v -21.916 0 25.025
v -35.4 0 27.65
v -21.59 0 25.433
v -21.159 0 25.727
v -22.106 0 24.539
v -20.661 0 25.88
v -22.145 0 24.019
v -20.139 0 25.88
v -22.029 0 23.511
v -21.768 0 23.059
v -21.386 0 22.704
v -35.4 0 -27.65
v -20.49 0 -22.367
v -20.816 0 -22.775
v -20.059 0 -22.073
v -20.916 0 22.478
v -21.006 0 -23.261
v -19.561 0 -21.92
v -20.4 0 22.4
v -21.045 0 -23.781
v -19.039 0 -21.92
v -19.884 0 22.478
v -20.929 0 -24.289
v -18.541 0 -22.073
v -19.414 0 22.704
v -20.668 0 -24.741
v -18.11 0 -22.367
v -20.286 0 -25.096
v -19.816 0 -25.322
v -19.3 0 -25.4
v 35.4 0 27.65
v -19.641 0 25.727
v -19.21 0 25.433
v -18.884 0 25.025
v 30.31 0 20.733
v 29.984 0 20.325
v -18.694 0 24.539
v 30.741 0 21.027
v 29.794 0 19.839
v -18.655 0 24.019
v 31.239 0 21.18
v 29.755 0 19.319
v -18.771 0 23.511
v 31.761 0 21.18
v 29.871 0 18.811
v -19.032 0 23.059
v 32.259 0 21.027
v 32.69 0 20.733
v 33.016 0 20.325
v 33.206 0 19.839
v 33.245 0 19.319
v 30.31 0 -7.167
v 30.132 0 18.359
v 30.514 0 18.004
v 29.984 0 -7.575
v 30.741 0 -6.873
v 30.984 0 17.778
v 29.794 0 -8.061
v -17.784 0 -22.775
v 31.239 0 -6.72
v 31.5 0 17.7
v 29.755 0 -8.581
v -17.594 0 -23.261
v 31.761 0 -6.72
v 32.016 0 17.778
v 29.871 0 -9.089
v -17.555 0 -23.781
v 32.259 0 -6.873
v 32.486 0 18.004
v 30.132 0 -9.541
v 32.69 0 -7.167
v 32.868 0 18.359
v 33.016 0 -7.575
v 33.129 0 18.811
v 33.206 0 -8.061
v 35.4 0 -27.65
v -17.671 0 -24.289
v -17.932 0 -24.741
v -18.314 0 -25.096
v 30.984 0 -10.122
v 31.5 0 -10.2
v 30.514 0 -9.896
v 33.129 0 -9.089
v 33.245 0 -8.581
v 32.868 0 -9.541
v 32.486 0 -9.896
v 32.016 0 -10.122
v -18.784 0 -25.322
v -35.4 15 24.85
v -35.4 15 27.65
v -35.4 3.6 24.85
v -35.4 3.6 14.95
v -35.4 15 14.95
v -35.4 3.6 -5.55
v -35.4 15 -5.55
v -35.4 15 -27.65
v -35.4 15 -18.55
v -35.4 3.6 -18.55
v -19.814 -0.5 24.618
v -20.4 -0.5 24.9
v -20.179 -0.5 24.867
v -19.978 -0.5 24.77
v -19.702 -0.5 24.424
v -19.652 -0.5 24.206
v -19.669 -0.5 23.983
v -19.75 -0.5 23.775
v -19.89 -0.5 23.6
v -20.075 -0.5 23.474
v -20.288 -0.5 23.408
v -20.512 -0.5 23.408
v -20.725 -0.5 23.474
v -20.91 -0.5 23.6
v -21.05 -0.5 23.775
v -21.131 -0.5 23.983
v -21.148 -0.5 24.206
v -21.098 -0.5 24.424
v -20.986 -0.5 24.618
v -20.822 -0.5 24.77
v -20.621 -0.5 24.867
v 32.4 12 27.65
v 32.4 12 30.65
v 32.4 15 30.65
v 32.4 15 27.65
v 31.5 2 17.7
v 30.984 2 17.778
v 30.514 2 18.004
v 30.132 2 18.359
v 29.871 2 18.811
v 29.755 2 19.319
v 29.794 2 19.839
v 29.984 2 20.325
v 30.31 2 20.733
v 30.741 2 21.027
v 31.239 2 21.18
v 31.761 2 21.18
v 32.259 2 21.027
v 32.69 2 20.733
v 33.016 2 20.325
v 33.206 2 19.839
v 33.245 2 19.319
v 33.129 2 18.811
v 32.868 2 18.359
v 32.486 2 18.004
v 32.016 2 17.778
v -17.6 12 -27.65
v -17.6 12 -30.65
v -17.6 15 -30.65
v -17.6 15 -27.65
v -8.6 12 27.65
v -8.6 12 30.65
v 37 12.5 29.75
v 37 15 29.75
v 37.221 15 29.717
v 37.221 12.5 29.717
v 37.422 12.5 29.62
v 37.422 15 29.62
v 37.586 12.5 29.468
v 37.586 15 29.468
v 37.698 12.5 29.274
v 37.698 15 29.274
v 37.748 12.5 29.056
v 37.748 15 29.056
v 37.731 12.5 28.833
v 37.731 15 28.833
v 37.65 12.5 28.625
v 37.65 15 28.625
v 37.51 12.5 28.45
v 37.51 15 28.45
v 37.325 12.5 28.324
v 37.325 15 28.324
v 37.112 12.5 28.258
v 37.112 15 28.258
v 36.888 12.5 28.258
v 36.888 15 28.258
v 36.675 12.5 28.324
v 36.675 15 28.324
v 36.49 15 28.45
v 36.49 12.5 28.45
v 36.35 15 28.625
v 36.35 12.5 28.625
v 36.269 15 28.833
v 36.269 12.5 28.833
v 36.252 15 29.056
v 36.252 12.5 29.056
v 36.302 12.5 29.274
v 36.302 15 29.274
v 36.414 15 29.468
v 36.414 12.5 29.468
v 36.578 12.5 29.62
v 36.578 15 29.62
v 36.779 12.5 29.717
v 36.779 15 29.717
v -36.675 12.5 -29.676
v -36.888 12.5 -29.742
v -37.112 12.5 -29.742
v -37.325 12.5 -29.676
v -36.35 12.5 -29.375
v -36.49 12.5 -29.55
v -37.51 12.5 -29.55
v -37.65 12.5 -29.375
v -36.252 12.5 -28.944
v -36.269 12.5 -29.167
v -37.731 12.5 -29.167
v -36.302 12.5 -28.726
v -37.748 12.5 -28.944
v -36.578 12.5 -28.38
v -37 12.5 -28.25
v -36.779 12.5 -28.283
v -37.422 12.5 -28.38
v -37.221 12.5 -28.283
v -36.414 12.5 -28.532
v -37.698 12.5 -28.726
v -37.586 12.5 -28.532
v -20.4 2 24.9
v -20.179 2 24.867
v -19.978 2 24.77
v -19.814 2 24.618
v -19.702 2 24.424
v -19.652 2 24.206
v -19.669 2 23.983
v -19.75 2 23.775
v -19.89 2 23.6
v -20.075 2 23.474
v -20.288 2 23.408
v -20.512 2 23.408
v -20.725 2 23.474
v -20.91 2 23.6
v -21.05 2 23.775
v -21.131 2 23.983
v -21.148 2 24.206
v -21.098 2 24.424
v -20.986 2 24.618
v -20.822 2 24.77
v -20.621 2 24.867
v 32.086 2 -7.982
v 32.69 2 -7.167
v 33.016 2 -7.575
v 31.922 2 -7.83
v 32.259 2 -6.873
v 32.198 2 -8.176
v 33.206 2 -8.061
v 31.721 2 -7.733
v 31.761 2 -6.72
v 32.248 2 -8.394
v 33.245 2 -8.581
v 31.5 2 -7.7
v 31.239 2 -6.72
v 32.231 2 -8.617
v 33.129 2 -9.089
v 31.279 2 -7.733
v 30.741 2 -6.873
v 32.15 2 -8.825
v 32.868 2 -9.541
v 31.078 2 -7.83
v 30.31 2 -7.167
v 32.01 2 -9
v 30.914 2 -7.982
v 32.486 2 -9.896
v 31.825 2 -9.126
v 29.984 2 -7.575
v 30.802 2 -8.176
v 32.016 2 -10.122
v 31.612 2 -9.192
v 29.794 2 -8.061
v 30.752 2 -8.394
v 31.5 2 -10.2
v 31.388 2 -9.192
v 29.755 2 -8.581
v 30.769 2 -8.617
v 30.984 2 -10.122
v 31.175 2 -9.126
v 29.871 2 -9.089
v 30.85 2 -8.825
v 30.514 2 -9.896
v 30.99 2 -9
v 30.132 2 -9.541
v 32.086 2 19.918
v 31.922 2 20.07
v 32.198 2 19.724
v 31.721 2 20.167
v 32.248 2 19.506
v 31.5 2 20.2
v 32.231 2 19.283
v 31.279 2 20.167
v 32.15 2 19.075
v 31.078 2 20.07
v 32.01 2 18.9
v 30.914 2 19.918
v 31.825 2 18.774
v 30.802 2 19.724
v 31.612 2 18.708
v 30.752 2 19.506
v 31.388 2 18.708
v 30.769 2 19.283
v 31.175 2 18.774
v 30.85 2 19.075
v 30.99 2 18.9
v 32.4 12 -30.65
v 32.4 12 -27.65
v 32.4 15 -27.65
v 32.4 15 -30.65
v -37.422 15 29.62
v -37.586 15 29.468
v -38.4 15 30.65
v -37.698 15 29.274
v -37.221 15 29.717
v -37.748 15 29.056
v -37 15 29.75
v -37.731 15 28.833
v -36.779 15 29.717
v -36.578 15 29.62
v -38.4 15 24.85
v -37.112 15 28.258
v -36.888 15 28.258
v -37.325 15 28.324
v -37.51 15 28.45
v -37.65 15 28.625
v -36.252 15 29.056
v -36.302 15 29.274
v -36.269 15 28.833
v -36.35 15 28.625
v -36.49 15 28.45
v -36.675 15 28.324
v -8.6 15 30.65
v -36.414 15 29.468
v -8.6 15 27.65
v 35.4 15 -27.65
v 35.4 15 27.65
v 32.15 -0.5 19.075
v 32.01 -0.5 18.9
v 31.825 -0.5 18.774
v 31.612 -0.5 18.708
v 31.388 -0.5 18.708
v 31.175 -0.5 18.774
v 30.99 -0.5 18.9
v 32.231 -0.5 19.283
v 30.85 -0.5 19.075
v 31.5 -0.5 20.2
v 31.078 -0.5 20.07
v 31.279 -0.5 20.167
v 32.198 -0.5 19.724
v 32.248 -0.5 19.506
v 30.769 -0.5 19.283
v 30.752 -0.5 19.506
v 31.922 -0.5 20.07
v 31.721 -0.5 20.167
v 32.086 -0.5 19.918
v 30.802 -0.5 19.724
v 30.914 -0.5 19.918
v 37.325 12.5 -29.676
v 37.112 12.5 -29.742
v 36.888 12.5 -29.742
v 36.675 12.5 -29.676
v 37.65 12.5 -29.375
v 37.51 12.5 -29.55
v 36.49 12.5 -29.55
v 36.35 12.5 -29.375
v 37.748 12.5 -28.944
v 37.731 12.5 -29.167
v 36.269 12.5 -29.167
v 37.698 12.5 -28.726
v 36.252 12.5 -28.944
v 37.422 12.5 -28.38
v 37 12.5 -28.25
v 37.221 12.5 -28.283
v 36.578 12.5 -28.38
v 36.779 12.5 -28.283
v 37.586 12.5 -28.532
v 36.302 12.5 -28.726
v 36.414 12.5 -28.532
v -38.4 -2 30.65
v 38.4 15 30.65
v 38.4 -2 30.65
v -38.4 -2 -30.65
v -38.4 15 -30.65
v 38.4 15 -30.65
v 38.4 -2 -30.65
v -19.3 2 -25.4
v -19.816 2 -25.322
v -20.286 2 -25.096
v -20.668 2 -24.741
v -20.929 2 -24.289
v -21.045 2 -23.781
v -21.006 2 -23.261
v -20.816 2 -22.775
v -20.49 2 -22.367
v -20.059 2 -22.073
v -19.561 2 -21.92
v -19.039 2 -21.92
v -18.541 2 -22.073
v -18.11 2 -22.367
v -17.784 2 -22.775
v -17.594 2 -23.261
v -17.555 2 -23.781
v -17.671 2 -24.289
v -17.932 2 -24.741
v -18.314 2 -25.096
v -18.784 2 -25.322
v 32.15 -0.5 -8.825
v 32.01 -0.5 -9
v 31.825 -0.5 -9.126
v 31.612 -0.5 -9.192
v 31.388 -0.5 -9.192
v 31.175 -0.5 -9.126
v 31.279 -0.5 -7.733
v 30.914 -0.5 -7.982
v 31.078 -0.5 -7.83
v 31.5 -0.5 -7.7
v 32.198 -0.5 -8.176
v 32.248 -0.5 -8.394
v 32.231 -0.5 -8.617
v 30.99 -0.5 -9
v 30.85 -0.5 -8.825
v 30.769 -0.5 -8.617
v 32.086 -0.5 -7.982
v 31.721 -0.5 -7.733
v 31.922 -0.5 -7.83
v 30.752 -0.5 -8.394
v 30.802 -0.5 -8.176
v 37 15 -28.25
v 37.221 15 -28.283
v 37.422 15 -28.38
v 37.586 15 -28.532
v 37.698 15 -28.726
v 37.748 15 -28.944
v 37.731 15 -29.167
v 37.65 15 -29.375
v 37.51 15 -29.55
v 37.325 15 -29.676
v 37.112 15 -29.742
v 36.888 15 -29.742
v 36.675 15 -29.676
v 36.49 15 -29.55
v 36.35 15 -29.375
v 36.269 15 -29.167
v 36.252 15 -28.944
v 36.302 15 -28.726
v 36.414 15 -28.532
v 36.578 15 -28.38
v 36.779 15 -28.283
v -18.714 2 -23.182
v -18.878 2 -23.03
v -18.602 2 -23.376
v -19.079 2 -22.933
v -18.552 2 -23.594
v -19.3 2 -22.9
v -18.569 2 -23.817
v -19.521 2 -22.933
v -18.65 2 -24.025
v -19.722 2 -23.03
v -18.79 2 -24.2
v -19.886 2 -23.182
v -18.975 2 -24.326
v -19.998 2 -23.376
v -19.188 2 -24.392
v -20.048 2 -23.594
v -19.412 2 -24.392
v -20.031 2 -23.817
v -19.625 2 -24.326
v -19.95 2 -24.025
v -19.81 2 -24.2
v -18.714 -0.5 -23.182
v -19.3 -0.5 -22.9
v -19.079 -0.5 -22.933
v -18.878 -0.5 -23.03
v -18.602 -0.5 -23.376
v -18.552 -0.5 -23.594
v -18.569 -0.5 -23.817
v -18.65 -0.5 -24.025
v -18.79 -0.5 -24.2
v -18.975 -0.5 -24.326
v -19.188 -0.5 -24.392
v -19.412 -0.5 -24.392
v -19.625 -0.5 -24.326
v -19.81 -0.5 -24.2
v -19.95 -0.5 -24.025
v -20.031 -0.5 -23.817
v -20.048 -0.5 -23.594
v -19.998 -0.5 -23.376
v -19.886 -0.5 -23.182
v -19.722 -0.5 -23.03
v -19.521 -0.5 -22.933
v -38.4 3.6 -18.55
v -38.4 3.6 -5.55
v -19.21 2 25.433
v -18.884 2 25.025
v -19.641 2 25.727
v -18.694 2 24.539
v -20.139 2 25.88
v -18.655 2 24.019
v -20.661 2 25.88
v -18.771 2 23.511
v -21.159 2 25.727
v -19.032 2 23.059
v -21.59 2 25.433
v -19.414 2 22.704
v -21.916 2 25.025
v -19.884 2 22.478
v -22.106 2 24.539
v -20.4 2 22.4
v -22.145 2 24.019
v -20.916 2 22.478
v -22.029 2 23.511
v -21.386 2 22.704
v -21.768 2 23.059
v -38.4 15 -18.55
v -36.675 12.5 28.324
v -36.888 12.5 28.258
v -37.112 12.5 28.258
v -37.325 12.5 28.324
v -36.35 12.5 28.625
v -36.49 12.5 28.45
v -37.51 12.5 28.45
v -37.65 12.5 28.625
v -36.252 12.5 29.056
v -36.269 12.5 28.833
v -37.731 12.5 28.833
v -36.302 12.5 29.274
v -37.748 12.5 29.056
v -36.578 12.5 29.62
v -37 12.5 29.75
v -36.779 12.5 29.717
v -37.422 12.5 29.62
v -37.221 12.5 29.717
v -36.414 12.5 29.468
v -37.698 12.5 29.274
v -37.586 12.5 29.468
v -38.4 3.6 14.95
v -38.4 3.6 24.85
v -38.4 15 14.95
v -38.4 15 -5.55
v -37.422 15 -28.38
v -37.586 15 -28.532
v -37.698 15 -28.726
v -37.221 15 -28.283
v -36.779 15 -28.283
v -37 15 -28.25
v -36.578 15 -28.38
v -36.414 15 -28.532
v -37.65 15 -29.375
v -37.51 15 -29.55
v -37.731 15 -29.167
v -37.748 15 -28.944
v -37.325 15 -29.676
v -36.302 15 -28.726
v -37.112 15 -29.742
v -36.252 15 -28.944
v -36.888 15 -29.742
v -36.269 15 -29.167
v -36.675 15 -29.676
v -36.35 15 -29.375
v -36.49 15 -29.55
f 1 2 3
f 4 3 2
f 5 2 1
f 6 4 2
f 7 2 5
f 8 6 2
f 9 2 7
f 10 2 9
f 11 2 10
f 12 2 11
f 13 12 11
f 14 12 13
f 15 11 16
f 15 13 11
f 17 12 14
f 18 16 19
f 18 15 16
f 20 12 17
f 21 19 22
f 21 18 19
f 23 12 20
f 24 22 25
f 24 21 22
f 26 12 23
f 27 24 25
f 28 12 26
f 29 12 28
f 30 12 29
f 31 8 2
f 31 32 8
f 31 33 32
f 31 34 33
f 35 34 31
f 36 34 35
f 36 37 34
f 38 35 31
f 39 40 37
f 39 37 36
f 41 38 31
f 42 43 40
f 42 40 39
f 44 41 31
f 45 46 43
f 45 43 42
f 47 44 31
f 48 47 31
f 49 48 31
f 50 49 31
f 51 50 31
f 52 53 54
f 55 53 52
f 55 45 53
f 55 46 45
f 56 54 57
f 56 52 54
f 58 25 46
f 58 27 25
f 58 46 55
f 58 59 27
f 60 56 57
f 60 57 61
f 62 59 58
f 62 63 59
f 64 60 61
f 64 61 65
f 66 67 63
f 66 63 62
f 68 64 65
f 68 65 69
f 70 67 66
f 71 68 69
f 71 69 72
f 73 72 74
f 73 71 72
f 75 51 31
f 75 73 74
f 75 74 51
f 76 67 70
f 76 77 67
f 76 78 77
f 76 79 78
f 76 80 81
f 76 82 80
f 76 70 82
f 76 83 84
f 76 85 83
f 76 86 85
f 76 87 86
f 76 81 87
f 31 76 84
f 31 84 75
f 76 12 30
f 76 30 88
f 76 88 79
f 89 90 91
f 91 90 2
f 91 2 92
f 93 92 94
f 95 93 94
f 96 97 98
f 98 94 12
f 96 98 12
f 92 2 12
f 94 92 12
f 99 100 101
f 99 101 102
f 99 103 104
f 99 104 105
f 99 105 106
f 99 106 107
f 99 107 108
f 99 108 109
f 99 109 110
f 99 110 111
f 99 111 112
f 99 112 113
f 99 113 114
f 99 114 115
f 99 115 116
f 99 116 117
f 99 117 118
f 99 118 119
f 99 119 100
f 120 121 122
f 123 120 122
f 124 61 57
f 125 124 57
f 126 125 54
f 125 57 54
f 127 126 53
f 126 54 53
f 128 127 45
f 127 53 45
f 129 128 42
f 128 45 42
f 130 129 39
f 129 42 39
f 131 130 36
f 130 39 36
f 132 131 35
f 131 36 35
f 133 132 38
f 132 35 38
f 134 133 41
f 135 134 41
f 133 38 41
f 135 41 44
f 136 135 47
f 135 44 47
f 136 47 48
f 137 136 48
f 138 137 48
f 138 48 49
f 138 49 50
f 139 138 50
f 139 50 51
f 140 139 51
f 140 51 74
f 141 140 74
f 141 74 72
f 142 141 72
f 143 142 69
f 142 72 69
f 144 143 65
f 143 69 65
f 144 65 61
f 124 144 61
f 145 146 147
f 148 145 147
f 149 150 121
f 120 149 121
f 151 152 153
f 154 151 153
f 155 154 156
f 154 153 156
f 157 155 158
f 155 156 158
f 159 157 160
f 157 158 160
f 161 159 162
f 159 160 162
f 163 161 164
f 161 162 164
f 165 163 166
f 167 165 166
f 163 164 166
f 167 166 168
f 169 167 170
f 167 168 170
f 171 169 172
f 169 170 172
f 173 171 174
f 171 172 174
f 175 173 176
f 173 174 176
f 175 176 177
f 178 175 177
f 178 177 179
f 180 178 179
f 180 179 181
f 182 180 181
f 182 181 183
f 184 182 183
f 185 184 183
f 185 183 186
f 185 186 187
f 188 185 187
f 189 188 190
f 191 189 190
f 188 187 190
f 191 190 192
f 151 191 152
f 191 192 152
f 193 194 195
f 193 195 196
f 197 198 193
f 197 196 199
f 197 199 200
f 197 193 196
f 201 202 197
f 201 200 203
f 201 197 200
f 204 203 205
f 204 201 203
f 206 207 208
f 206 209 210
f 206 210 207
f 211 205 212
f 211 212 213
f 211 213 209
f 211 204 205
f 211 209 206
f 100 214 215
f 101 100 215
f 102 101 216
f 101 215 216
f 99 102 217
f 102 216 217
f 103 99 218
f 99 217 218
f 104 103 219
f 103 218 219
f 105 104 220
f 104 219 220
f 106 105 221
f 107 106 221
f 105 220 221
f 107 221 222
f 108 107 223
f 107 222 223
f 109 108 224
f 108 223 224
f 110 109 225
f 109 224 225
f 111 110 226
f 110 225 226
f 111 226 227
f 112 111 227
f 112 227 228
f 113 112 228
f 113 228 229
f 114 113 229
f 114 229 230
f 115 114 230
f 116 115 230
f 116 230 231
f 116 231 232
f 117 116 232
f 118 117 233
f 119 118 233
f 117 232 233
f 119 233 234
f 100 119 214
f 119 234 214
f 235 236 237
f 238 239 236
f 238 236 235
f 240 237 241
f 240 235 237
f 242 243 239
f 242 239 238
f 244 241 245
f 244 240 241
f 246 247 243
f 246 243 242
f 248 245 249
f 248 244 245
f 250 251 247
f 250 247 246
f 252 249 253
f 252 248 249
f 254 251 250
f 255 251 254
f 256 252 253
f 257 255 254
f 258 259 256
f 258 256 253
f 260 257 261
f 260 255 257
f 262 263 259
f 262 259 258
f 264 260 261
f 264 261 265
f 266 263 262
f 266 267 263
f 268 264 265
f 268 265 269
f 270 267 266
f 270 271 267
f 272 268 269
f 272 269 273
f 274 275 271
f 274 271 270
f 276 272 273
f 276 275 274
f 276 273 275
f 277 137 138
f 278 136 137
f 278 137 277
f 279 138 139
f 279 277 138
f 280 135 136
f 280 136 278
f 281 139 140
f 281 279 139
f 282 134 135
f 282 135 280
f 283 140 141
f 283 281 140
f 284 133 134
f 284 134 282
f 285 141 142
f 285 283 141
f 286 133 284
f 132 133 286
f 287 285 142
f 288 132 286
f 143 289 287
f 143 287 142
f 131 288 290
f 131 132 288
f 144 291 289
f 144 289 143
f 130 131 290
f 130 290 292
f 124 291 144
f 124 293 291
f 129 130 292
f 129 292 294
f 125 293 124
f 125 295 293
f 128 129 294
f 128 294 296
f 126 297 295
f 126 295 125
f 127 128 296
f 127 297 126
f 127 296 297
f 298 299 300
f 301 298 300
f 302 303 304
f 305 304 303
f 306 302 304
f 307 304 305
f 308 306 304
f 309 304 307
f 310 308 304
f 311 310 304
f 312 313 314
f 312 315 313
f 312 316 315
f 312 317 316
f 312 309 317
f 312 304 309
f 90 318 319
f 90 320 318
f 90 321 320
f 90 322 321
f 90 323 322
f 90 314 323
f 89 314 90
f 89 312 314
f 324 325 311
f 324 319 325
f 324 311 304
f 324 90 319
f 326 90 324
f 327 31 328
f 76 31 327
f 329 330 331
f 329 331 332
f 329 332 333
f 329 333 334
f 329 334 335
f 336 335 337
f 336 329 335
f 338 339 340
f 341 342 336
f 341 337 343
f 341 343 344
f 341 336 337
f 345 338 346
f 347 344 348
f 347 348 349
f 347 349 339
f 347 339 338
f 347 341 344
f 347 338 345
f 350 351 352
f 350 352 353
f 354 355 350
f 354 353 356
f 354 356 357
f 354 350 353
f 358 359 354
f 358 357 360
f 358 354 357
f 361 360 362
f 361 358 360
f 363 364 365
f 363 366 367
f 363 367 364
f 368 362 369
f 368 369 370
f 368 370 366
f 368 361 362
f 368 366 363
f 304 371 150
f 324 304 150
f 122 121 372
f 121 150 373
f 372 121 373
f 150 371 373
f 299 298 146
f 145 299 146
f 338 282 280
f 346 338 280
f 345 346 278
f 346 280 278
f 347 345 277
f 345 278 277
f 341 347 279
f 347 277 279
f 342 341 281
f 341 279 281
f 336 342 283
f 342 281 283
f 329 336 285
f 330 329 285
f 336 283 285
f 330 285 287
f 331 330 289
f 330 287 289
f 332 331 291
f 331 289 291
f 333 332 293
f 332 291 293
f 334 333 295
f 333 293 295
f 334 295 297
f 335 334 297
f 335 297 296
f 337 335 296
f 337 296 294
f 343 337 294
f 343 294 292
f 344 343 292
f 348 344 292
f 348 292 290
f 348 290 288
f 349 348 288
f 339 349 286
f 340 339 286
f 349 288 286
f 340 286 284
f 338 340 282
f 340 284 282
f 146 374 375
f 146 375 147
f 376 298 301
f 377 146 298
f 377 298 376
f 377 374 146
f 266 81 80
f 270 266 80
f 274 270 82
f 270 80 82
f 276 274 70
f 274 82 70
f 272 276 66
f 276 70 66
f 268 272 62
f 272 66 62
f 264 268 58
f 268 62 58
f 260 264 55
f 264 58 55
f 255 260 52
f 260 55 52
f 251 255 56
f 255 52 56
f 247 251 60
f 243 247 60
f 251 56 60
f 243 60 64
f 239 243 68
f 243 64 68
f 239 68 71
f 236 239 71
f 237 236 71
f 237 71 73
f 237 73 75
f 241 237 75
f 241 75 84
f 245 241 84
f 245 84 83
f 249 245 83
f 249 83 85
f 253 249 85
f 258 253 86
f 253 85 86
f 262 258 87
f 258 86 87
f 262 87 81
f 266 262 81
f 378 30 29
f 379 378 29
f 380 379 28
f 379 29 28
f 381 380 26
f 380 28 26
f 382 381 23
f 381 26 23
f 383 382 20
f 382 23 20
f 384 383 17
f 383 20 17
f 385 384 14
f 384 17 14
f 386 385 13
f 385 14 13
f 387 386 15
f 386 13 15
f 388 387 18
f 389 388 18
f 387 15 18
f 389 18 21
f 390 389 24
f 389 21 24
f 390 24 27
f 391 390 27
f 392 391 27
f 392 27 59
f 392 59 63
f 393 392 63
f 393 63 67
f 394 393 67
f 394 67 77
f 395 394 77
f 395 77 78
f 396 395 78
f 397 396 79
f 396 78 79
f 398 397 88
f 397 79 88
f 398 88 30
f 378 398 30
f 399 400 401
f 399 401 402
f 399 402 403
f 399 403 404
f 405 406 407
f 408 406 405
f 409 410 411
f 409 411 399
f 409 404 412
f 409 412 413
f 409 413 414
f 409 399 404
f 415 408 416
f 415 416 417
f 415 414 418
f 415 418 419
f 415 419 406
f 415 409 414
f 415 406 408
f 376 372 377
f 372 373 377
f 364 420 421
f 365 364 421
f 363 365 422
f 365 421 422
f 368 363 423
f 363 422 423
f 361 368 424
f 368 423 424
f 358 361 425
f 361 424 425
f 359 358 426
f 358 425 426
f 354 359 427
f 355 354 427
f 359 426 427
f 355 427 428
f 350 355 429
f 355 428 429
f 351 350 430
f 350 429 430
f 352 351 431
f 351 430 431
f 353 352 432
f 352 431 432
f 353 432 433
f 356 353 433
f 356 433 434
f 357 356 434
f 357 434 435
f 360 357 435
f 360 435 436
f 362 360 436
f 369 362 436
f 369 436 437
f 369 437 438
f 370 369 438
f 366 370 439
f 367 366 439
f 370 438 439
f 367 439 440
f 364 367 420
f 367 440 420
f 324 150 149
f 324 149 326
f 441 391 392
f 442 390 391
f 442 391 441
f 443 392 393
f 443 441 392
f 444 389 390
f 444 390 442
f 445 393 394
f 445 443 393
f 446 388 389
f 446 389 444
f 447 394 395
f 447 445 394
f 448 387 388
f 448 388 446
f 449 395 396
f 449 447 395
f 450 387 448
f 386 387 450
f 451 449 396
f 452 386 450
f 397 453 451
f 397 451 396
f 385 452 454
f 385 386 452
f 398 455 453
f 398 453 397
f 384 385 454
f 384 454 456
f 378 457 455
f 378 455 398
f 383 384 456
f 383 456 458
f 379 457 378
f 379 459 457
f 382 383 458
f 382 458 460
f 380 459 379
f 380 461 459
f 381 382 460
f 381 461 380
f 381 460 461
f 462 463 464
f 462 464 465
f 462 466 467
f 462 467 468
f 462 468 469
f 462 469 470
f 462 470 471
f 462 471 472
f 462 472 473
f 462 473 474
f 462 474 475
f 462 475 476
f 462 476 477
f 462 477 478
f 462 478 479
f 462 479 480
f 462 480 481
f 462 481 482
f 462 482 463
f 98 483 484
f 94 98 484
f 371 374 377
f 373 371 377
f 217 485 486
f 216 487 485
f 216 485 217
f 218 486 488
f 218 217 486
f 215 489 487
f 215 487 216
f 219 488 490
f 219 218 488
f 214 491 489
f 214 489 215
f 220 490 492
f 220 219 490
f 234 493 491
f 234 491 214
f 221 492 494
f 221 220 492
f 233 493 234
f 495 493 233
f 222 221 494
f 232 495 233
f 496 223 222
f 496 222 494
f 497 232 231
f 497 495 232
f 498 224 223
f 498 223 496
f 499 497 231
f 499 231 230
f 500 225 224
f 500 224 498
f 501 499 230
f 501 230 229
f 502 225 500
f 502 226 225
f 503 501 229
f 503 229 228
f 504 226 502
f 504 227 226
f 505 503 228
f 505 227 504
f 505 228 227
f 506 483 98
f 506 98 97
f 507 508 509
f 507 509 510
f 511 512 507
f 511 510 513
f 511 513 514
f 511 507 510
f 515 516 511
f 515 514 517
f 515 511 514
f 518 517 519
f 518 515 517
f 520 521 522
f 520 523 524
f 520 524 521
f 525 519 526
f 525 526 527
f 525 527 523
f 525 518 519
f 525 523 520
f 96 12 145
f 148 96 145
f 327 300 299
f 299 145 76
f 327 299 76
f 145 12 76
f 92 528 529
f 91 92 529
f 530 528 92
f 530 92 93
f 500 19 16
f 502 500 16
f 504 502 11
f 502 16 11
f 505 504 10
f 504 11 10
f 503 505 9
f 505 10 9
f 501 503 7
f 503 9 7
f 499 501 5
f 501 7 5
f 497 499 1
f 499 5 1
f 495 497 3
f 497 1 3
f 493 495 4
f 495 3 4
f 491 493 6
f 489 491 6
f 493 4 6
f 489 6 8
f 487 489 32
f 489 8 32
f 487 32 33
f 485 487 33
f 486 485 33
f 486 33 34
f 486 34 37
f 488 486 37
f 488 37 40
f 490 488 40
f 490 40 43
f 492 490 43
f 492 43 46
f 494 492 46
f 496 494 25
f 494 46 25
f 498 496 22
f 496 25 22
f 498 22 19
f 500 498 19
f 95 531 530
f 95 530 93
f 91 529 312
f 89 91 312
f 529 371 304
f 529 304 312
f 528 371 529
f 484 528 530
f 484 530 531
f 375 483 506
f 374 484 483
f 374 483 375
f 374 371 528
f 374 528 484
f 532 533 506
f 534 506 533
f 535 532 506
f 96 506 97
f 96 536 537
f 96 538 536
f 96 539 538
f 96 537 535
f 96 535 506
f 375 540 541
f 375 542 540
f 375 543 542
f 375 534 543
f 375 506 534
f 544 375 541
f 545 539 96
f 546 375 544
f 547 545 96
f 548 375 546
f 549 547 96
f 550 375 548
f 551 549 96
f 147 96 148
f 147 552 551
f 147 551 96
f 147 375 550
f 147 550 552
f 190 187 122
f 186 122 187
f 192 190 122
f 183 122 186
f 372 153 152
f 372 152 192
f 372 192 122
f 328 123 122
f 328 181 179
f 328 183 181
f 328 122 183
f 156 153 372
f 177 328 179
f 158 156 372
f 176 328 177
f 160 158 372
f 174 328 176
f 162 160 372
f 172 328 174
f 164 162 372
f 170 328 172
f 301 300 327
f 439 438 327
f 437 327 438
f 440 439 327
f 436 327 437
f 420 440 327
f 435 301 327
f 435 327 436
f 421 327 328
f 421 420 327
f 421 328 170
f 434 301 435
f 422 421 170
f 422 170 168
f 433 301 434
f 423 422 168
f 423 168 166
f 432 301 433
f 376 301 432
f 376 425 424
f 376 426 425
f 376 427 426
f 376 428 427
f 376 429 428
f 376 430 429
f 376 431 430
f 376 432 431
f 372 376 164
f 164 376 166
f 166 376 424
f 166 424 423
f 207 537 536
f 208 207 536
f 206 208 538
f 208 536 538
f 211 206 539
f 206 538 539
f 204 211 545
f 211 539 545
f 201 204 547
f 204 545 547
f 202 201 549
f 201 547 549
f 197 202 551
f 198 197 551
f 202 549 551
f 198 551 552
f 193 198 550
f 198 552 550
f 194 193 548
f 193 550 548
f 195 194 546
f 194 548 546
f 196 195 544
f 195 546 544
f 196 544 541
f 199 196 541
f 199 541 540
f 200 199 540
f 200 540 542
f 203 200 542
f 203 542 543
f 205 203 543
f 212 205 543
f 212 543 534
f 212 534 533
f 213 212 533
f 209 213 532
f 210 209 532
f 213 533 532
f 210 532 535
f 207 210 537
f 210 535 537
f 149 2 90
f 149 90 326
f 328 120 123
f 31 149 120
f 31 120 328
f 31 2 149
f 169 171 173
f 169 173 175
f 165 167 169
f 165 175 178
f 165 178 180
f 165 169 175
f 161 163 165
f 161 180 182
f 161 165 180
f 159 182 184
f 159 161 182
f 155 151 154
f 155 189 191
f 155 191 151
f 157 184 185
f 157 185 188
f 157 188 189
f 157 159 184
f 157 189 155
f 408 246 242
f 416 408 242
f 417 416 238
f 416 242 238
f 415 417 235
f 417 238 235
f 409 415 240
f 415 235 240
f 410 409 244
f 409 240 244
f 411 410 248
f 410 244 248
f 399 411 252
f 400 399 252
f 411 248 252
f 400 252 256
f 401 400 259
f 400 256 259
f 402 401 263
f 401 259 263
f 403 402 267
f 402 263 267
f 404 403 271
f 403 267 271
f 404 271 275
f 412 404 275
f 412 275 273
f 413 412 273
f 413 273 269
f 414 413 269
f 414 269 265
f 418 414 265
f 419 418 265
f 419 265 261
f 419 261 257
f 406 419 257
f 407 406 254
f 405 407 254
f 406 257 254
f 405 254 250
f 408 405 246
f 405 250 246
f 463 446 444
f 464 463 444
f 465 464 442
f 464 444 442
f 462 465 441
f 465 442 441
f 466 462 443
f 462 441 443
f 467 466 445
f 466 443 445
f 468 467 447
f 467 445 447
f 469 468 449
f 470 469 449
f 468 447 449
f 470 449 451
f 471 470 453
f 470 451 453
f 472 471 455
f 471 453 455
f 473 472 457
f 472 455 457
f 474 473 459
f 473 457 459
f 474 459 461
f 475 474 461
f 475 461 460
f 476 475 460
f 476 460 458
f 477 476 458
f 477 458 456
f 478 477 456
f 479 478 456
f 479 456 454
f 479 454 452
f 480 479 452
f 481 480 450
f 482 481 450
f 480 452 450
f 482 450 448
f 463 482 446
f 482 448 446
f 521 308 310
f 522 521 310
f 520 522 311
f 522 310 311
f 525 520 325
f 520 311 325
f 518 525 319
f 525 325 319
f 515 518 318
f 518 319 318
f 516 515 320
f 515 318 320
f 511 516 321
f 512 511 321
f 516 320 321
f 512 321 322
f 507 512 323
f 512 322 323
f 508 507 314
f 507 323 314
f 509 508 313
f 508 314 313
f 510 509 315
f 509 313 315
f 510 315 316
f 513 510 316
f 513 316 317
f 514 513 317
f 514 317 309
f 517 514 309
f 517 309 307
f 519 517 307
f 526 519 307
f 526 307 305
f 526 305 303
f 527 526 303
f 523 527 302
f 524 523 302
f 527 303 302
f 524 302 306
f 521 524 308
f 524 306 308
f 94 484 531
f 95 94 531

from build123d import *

# Parameters (mm, degrees)
SKETCH1_W           = 76.8
SKETCH1_H           = 61.3
BOSS_EXTRUDE1_DEPTH = 2
SKETCH2_W           = 76.8
SKETCH2_H           = 61.3
SKETCH2_W_2         = 70.8
SKETCH2_H_2         = 55.3
BOSS_EXTRUDE2_DEPTH = 15
CUT_EXTRUDE1_REACH  = 86.04
SKETCH6_W           = 13
SKETCH6_H           = 14.670742809
CUT_EXTRUDE2_REACH  = 86.04
SKETCH7_W           = 9.9
SKETCH7_H           = 11.743698963
CUT_EXTRUDE3_REACH  = 75.873
SKETCH8_W           = 41
SKETCH8_H           = 11.477298103
CUT_EXTRUDE4_REACH  = 75.873
SKETCH9_W           = 50
SKETCH9_H           = 13.6396876
SKETCH10_R          = 1.75
BOSS_EXTRUDE4_DEPTH = 2
SKETCH11_R          = 0.75
CUT_EXTRUDE5_DEPTH  = 2.5
SKETCH12_R          = 0.75
CUT_EXTRUDE6_DEPTH  = 2.5


with BuildPart() as part:
    # Sketch1 → Boss-Extrude1 (new body)
    with BuildSketch(Plane(origin=(0, 0, 0), x_dir=(1, 0, 0), z_dir=(0, 1, 0))):
        Rectangle(SKETCH1_W, SKETCH1_H)
    extrude(amount=-BOSS_EXTRUDE1_DEPTH)

    # Sketch2 → Boss-Extrude2 (add)
    with BuildSketch(Plane(origin=(0, 0, 0), x_dir=(1, 0, 0), z_dir=(0, 1, 0))):
        Rectangle(SKETCH2_W, SKETCH2_H)
        Rectangle(SKETCH2_W_2, SKETCH2_H_2, mode=Mode.SUBTRACT)
    extrude(amount=BOSS_EXTRUDE2_DEPTH)

    # Sketch6 → Cut-Extrude1 (cut, up to next)
    with BuildSketch(Plane.ZY.offset(38.4), mode=Mode.PRIVATE) as cut_extrude1_sk1:
        with Locations((-12.05, 10.935371405)):
            Rectangle(SKETCH6_W, SKETCH6_H)
    cut_extrude1_tool1 = extrude(cut_extrude1_sk1.sketch, amount=-CUT_EXTRUDE1_REACH, mode=Mode.PRIVATE) & part.part
    add(cut_extrude1_tool1.solids().sort_by_distance((-38.4, 10.935371, -12.05))[0], mode=Mode.SUBTRACT)

    # Sketch7 → Cut-Extrude2 (cut, up to next)
    with BuildSketch(Plane.ZY.offset(38.4), mode=Mode.PRIVATE) as cut_extrude2_sk1:
        with Locations((19.9, 9.471849482)):
            Rectangle(SKETCH7_W, SKETCH7_H)
    cut_extrude2_tool1 = extrude(cut_extrude2_sk1.sketch, amount=-CUT_EXTRUDE2_REACH, mode=Mode.PRIVATE) & part.part
    add(cut_extrude2_tool1.solids().sort_by_distance((-38.4, 9.471849, 19.9))[0], mode=Mode.SUBTRACT)

    # Sketch8 → Cut-Extrude3 (cut, up to next)
    with BuildSketch(Plane.XY.offset(30.65), mode=Mode.PRIVATE) as cut_extrude3_sk1:
        with Locations((11.9, 17.738649052)):
            Rectangle(SKETCH8_W, SKETCH8_H)
    cut_extrude3_tool1 = extrude(cut_extrude3_sk1.sketch, amount=-CUT_EXTRUDE3_REACH, mode=Mode.PRIVATE) & part.part
    add(cut_extrude3_tool1.solids().sort_by_distance((11.9, 17.738649, 30.65))[0], mode=Mode.SUBTRACT)

    # Sketch9 → Cut-Extrude4 (cut, up to next)
    with BuildSketch(Plane(origin=(0, 0, -30.65), x_dir=(-1, 0, 0), z_dir=(0, 0, -1)), mode=Mode.PRIVATE) as cut_extrude4_sk1:
        with Locations((-7.4, 18.8198438)):
            Rectangle(SKETCH9_W, SKETCH9_H)
    cut_extrude4_tool1 = extrude(cut_extrude4_sk1.sketch, amount=-CUT_EXTRUDE4_REACH, mode=Mode.PRIVATE) & part.part
    add(cut_extrude4_tool1.solids().sort_by_distance((7.4, 18.819844, -30.65))[0], mode=Mode.SUBTRACT)

    # Sketch10 → Boss-Extrude4 (add)
    with BuildSketch(Plane(origin=(0, 0, 0), x_dir=(1, 0, 0), z_dir=(0, 1, 0))):
        with Locations(Location((-19.3, 23.65, 0), (0, 0, 90))):
            Circle(SKETCH10_R)
        with Locations(Location((-20.4, -24.15, 0), (0, 0, 90))):
            Circle(SKETCH10_R)
        with Locations(Location((31.5, 8.45, 0), (0, 0, 90))):
            Circle(SKETCH10_R)
        with Locations(Location((31.5, -19.45, 0), (0, 0, 90))):
            Circle(SKETCH10_R)
    extrude(amount=BOSS_EXTRUDE4_DEPTH)

    # Sketch11 → Cut-Extrude5 (cut)
    with BuildSketch(Plane(origin=(0, 2, 0), x_dir=(1, 0, 0), z_dir=(0, 1, 0))):
        with Locations(Location((-19.3, 23.65, 0), (0, 0, 270))):
            Circle(SKETCH11_R)
        with Locations(Location((-20.4, -24.15, 0), (0, 0, 270))):
            Circle(SKETCH11_R)
        with Locations(Location((31.5, 8.45, 0), (0, 0, 270))):
            Circle(SKETCH11_R)
        with Locations(Location((31.5, -19.45, 0), (0, 0, 270))):
            Circle(SKETCH11_R)
    extrude(amount=-CUT_EXTRUDE5_DEPTH, mode=Mode.SUBTRACT)

    # Sketch12 → Cut-Extrude6 (cut)
    with BuildSketch(Plane(origin=(0, 15, 0), x_dir=(1, 0, 0), z_dir=(0, 1, 0))):
        with Locations(Location((-37, 29, 0), (0, 0, 270))):
            Circle(SKETCH12_R)
        with Locations(Location((37, 29, 0), (0, 0, 270))):
            Circle(SKETCH12_R)
        with Locations(Location((37, -29, 0), (0, 0, 270))):
            Circle(SKETCH12_R)
        with Locations(Location((-37, -29, 0), (0, 0, 270))):
            Circle(SKETCH12_R)
    extrude(amount=-CUT_EXTRUDE6_DEPTH, mode=Mode.SUBTRACT)


solid = part.part
